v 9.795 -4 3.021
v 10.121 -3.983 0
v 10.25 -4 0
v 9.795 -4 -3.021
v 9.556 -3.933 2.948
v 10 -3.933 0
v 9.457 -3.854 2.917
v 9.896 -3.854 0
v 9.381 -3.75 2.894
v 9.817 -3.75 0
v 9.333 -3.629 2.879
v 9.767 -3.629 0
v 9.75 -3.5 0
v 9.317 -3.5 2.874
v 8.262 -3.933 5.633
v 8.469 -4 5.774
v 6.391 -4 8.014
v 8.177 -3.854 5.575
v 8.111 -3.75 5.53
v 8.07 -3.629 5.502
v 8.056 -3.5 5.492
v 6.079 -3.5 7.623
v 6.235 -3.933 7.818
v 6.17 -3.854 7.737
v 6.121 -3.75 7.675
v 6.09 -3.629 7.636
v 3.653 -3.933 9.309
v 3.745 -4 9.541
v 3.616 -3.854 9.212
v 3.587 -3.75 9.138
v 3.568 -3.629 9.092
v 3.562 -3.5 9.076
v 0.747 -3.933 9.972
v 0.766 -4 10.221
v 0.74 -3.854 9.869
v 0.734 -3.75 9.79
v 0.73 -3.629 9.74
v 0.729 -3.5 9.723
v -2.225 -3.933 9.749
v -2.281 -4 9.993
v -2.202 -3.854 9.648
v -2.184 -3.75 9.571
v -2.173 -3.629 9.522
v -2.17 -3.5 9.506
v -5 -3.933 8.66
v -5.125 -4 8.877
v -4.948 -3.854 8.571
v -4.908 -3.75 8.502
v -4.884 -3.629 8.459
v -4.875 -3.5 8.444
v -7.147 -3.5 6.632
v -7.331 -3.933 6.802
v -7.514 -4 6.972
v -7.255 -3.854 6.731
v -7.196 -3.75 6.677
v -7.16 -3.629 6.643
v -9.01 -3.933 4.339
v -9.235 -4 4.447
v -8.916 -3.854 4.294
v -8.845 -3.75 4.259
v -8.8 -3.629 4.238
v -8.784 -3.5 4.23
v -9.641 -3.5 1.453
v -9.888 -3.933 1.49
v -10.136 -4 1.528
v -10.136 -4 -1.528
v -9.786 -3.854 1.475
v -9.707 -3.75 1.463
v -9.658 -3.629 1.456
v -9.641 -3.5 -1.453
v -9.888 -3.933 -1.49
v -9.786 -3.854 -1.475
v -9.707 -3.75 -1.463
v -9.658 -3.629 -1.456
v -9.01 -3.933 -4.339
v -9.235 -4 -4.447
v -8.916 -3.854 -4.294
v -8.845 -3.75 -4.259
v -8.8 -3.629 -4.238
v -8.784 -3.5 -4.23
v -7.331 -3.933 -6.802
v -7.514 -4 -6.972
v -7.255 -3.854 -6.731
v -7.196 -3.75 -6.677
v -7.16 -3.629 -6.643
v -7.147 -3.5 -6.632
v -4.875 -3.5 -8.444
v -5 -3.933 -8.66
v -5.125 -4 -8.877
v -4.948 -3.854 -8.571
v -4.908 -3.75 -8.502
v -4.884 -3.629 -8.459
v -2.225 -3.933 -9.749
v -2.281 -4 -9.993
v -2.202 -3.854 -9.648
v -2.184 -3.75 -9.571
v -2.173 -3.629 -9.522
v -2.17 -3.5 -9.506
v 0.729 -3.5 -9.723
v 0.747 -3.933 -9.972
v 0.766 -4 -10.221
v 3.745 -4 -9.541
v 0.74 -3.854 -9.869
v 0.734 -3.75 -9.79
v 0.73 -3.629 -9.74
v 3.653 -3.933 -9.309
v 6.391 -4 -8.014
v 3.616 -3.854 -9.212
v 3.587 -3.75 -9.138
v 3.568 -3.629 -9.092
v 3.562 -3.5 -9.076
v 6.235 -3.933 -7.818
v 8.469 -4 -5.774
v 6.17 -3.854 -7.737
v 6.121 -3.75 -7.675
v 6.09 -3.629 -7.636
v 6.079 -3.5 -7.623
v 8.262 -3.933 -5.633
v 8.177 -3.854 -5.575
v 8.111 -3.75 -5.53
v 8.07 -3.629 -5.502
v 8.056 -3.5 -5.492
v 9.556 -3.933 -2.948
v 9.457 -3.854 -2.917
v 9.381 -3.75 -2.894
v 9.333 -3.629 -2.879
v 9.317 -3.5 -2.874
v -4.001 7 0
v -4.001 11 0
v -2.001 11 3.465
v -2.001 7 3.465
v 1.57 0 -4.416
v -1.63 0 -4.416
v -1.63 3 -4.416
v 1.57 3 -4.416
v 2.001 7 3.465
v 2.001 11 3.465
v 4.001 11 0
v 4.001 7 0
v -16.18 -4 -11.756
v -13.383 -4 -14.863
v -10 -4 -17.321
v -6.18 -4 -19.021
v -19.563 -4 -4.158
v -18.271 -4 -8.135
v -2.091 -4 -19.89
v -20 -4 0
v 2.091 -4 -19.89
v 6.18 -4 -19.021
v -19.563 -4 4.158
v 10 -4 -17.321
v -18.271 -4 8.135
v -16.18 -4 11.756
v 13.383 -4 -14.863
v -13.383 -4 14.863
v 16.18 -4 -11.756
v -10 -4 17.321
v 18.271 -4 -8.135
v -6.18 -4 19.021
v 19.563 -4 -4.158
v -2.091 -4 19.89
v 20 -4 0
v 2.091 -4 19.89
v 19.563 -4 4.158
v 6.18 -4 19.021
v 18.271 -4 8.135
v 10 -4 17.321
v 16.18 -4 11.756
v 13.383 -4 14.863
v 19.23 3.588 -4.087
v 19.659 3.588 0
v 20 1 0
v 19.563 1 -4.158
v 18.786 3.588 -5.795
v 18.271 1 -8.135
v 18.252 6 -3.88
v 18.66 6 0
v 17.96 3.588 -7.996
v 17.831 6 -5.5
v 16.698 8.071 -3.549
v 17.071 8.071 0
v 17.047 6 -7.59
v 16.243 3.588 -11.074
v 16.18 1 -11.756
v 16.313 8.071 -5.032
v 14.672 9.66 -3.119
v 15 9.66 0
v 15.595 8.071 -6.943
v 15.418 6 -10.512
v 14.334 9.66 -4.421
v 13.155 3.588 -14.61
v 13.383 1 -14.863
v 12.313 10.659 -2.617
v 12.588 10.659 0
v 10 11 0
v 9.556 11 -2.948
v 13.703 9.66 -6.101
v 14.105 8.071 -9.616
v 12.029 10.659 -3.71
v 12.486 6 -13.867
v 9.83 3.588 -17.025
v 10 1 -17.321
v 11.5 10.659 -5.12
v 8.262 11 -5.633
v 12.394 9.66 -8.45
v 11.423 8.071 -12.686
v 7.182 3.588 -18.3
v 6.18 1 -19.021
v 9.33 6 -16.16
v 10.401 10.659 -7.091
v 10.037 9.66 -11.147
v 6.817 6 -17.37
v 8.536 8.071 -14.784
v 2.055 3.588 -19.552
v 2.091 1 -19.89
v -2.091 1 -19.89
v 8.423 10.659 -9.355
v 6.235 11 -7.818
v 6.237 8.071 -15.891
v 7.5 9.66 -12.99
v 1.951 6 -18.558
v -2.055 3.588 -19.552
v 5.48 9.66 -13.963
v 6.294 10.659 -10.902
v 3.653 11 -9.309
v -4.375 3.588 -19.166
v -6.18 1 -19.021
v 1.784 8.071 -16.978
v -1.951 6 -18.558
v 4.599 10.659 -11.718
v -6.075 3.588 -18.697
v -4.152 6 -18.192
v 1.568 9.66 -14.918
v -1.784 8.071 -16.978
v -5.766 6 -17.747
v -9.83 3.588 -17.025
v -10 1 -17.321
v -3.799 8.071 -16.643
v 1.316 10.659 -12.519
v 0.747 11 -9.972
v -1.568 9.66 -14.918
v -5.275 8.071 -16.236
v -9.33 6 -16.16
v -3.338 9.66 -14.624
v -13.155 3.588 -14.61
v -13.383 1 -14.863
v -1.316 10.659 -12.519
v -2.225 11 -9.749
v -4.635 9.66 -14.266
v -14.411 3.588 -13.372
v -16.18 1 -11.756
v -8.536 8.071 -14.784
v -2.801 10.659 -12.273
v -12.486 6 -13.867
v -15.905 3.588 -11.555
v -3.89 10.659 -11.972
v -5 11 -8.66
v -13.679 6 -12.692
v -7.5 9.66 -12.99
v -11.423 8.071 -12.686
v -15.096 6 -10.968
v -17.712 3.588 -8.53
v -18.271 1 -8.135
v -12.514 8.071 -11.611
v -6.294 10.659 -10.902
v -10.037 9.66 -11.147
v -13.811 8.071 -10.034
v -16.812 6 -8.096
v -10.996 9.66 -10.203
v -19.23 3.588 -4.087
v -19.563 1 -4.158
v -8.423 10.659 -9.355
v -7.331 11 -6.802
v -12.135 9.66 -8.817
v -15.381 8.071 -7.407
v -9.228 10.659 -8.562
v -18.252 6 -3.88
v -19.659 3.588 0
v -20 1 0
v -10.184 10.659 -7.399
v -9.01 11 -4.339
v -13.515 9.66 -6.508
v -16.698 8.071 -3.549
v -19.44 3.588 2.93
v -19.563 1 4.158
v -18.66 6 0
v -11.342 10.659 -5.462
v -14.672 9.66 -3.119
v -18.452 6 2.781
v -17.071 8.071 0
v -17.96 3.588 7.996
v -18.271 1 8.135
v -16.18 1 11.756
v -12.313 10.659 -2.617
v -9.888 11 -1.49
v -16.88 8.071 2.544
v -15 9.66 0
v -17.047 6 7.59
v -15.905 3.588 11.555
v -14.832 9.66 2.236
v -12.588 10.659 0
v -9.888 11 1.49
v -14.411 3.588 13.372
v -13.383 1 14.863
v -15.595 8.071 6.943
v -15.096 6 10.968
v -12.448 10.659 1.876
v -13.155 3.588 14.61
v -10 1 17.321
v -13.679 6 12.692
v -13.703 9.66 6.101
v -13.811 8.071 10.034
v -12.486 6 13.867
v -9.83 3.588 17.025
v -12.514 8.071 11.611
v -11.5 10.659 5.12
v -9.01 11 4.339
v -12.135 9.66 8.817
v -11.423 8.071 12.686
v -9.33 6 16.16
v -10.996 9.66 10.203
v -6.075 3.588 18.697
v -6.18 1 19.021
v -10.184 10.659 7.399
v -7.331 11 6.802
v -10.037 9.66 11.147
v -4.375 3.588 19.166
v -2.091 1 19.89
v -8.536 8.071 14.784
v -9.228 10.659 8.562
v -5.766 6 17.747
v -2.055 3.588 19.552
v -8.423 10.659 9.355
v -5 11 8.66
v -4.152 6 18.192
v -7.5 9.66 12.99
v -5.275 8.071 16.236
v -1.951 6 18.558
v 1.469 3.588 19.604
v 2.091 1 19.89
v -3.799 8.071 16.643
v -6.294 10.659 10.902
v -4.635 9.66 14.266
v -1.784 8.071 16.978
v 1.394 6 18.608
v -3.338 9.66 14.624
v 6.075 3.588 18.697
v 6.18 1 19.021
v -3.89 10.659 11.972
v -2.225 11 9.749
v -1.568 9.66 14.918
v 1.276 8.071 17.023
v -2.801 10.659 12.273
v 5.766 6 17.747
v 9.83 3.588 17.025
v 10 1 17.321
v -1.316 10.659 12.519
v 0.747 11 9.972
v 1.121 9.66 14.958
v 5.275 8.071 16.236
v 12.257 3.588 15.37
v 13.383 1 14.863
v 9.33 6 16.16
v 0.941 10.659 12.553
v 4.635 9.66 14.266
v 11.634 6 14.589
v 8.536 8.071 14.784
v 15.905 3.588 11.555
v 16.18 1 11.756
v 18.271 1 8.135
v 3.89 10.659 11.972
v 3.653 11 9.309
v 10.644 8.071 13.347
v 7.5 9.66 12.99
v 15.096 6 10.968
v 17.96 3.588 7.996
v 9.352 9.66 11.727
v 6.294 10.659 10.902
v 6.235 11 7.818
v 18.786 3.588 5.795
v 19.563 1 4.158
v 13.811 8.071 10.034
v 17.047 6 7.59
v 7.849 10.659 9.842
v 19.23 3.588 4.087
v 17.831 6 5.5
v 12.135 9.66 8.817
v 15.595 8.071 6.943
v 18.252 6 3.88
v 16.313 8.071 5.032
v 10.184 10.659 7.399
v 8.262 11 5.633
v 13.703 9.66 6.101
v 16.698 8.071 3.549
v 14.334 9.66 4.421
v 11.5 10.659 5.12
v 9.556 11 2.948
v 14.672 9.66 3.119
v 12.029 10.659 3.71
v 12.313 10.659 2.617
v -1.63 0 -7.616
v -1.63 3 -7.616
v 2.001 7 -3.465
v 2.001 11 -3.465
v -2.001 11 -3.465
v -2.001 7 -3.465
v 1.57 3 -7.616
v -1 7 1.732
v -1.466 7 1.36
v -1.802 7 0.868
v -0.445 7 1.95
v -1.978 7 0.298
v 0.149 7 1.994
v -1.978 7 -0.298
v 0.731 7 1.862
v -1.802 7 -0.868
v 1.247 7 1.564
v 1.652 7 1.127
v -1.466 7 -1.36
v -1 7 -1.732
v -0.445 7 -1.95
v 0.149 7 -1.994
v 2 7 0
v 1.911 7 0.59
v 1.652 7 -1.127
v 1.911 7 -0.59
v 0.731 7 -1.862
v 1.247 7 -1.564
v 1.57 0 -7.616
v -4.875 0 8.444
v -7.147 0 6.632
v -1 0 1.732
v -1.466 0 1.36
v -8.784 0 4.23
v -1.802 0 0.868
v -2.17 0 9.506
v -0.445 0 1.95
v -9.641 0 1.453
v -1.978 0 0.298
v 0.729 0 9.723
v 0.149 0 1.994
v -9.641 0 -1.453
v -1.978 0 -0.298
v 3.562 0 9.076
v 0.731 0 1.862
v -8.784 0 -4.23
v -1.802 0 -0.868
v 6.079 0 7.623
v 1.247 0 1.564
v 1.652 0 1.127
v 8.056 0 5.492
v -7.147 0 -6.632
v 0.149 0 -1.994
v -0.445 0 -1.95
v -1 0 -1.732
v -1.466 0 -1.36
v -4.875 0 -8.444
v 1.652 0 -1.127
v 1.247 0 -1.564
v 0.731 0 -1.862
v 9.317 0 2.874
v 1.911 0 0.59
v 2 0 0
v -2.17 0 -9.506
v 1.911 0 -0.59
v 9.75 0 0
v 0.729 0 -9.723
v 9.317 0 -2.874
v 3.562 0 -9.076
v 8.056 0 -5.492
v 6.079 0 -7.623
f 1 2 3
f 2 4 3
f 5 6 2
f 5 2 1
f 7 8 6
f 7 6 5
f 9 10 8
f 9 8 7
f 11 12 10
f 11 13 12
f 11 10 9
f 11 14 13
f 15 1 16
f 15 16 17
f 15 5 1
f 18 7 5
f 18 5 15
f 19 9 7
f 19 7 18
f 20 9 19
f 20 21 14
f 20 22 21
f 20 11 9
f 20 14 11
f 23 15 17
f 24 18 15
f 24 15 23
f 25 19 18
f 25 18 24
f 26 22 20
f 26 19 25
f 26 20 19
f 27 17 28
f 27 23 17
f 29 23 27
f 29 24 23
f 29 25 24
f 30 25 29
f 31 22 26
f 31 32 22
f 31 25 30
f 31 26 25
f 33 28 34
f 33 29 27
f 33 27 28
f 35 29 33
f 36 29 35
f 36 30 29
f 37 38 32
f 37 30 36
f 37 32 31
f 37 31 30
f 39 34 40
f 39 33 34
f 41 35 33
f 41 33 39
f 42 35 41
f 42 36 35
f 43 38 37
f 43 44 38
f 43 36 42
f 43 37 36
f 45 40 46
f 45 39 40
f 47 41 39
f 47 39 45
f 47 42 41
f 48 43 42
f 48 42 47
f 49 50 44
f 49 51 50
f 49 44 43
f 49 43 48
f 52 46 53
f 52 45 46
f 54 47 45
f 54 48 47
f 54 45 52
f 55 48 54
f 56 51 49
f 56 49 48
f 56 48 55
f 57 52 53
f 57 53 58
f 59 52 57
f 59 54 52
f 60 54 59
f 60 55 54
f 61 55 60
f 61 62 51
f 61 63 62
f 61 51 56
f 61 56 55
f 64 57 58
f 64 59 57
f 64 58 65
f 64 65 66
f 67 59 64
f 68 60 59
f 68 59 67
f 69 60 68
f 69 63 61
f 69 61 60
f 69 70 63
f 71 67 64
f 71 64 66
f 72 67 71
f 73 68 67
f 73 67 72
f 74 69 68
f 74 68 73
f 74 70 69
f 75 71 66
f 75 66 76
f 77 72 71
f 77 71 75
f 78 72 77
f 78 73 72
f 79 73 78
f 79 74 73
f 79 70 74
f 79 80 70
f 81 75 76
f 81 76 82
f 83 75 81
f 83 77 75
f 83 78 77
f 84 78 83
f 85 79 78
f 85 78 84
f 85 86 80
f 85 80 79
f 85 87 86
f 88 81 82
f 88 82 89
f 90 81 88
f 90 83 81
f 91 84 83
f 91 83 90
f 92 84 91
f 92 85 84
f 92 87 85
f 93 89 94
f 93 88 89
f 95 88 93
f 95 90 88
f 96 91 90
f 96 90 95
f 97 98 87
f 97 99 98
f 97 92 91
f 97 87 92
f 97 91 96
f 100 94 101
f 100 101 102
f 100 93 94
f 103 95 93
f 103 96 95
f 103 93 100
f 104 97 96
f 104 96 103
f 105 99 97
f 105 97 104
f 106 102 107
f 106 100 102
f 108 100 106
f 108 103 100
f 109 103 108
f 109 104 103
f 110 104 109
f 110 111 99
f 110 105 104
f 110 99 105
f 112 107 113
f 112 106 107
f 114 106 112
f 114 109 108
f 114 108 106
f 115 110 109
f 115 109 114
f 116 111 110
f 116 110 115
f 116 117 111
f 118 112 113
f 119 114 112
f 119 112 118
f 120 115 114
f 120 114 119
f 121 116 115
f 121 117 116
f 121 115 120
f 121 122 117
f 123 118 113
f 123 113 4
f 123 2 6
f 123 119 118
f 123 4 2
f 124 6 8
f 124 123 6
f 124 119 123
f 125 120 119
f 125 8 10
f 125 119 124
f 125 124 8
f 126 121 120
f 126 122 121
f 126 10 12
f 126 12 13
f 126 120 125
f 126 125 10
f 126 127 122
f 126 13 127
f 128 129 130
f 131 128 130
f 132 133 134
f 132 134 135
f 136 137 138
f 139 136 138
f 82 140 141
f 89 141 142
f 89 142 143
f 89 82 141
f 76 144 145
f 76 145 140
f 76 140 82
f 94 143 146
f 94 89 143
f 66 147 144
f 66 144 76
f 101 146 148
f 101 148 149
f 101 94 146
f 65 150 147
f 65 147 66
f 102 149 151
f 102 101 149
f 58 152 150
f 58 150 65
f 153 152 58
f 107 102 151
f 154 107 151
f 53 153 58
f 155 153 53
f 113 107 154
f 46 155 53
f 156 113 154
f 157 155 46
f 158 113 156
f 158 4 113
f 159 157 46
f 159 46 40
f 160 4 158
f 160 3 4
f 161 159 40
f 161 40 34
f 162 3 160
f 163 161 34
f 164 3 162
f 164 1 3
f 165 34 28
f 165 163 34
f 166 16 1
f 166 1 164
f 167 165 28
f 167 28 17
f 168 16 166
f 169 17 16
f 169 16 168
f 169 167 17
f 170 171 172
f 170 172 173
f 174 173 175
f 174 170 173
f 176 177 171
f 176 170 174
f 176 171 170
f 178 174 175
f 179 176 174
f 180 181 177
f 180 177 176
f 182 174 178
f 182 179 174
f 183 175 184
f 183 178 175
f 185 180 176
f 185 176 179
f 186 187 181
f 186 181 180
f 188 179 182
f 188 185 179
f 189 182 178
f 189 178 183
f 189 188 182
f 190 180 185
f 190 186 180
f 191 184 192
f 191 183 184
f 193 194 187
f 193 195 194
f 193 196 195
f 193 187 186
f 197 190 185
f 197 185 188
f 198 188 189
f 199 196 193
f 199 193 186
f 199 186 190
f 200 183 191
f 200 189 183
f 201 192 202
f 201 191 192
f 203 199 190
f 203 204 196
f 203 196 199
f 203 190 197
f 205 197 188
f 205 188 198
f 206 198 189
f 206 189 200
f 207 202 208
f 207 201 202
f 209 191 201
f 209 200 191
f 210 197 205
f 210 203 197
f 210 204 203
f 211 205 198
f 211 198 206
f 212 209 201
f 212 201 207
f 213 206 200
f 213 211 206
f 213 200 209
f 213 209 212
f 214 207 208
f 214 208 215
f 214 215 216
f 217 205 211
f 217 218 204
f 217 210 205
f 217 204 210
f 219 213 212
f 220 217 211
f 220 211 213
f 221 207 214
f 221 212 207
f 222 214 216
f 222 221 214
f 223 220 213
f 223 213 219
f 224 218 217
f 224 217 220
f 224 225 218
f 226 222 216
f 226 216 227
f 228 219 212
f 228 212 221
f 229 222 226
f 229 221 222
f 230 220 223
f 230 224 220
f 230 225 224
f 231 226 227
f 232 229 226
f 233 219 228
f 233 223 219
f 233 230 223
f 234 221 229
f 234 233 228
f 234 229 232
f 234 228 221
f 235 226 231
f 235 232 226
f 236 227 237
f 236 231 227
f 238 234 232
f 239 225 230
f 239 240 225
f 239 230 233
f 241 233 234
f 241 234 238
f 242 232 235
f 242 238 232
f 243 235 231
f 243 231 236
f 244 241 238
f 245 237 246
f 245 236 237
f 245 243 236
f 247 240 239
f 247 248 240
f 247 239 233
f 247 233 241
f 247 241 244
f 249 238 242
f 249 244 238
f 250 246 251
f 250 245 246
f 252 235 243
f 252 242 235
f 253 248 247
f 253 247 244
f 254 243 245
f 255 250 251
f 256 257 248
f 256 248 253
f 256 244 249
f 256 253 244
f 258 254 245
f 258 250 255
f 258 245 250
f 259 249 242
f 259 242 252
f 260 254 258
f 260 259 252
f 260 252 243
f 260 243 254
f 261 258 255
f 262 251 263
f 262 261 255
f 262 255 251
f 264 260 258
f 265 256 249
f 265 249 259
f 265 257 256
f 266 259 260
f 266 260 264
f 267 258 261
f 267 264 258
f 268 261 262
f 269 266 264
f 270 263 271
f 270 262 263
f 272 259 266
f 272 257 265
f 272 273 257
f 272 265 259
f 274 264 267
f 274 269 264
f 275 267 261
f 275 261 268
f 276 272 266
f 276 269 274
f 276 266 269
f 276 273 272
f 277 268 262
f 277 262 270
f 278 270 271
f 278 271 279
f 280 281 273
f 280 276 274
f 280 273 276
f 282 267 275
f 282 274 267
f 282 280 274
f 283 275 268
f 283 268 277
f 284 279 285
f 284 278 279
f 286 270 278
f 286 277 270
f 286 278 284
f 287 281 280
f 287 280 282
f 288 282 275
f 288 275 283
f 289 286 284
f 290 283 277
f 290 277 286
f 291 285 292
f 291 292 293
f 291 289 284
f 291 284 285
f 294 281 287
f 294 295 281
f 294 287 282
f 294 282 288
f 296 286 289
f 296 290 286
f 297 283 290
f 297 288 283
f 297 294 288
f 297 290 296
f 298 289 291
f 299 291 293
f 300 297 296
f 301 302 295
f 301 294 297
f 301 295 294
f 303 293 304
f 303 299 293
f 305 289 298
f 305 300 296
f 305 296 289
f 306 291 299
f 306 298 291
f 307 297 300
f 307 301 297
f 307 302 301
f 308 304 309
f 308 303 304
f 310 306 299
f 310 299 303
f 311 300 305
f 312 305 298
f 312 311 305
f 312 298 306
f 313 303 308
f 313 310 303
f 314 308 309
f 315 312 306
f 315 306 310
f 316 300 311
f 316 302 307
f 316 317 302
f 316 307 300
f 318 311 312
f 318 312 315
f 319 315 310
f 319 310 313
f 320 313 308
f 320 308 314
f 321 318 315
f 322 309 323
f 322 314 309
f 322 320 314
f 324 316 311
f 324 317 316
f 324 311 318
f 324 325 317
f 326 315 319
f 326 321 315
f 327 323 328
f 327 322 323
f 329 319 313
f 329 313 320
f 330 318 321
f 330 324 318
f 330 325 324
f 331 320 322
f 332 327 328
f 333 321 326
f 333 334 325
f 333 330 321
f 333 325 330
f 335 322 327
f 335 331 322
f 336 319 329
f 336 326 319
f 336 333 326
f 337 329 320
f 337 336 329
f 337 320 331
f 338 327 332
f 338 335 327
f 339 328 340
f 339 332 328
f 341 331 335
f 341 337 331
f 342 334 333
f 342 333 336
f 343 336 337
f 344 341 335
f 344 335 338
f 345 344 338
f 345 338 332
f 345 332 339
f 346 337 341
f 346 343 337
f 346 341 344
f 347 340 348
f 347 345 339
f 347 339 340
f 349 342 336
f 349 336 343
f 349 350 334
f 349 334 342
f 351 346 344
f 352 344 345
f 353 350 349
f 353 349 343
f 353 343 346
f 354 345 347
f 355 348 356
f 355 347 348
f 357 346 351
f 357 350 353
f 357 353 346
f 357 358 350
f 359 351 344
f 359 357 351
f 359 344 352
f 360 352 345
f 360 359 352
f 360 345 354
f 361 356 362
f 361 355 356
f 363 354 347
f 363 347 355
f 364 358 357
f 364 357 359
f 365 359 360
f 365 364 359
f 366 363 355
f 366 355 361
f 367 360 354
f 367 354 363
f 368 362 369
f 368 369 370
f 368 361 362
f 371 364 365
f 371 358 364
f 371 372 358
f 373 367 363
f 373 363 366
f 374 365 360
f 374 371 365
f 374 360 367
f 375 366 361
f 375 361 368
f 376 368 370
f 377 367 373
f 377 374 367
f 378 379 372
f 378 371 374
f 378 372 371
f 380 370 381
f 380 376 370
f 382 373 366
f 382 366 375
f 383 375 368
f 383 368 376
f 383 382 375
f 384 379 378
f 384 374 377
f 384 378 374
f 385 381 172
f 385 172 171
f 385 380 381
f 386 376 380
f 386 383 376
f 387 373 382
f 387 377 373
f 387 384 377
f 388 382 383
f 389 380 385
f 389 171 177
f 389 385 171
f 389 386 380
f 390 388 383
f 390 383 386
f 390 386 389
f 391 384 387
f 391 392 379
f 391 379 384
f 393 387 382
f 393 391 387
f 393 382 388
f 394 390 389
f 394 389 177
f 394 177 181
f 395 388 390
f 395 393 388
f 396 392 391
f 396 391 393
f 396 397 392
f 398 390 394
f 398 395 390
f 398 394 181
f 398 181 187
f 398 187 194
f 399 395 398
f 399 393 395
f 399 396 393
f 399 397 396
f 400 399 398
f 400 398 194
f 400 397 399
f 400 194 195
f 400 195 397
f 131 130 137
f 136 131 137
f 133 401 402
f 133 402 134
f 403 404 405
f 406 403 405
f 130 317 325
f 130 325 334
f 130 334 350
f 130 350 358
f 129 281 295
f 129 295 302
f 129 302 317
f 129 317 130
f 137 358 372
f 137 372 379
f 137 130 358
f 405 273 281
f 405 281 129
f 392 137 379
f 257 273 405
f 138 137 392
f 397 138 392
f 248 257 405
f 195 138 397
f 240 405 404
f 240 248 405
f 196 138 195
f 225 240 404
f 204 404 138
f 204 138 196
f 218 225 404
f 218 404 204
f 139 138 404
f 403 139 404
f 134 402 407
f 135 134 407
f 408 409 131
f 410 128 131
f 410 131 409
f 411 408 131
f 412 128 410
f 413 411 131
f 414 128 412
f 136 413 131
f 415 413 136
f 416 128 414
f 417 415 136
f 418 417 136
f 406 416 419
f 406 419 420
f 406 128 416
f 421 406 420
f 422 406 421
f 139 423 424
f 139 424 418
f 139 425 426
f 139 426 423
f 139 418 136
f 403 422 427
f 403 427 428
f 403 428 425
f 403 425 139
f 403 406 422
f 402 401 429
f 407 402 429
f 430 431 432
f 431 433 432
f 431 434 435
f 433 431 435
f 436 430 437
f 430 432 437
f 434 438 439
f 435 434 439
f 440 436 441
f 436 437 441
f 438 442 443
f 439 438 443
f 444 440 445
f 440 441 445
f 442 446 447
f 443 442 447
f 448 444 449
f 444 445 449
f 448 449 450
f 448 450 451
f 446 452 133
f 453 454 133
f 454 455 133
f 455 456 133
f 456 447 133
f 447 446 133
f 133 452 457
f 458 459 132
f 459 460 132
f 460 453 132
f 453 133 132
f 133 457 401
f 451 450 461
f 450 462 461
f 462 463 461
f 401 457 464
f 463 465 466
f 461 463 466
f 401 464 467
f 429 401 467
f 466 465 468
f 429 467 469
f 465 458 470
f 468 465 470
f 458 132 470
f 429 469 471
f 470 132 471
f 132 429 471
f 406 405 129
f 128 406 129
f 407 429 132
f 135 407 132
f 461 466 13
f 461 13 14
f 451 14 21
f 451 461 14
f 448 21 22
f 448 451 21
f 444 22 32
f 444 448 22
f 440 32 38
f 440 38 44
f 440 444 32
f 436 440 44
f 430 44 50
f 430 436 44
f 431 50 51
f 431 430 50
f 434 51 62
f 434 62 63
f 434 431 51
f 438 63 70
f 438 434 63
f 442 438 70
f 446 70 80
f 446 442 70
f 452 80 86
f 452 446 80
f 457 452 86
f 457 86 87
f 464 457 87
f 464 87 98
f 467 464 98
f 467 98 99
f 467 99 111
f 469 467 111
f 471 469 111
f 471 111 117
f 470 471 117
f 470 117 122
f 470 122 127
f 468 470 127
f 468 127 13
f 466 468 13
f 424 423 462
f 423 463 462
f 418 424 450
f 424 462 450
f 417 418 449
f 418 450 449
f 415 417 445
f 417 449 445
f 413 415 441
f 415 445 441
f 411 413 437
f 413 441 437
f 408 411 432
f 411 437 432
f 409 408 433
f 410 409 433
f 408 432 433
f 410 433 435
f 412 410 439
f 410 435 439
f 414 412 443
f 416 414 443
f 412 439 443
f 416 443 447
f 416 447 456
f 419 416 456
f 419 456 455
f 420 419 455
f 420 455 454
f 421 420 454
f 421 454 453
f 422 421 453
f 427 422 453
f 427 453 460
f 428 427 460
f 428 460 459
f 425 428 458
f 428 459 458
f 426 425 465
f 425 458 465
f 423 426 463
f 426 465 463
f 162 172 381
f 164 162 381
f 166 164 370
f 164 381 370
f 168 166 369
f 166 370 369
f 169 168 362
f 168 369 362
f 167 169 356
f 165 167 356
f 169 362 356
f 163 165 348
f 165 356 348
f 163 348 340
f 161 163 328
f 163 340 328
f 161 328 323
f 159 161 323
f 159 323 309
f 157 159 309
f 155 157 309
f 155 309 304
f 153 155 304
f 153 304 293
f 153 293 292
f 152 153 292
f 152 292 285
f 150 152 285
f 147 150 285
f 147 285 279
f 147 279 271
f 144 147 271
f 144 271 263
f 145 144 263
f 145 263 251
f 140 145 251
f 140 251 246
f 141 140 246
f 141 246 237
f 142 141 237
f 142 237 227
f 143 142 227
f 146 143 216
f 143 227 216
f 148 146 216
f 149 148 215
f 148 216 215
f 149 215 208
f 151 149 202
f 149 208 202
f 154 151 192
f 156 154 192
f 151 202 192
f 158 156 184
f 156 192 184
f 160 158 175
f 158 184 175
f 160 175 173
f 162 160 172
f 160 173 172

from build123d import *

# Parameters (mm, degrees)
SKETCH1_R           = 9.75
SKETCH1_R_2         = 2
BOSS_EXTRUDE1_DEPTH = 3
SKETCH2_W           = 3.2
SKETCH2_H           = 3.2
CUT_EXTRUDE1_DEPTH  = 3
SKETCH3_R           = 20
BOSS_EXTRUDE2_DEPTH = 8
SKETCH4_R           = 20
SKETCH4_R_2         = 9.75
BOSS_EXTRUDE3_DEPTH = 7
FILLET2_R           = 10
SKETCH5_R           = 2
CUT_EXTRUDE2_DEPTH  = 9
CUT_EXTRUDE3_DEPTH  = 4
FILLET3_R           = 0.5


with BuildPart() as part:
    # Sketch1 → Boss-Extrude1 (new body)
    with BuildSketch(Plane(origin=(0, 0, 0), x_dir=(1, 0, 0), z_dir=(0, 1, 0))):
        Circle(SKETCH1_R)
        Circle(SKETCH1_R_2, mode=Mode.SUBTRACT)
    extrude(amount=BOSS_EXTRUDE1_DEPTH)

    # Sketch2 → Cut-Extrude1 (cut)
    with BuildSketch(Plane.XZ):
        with Locations((-0.030329448, -6.016441714)):
            Rectangle(SKETCH2_W, SKETCH2_H)
    extrude(amount=-CUT_EXTRUDE1_DEPTH, mode=Mode.SUBTRACT)

    # Sketch3 → Boss-Extrude2 (add)
    with BuildSketch(Plane(origin=(0, 3, 0), x_dir=(1, 0, 0), z_dir=(0, 1, 0))):
        Circle(SKETCH3_R)
    extrude(amount=BOSS_EXTRUDE2_DEPTH)

    # Sketch4 → Boss-Extrude3 (add)
    with BuildSketch(Plane.XZ.offset(-3)):
        Circle(SKETCH4_R)
        Circle(SKETCH4_R_2, mode=Mode.SUBTRACT)
    extrude(amount=BOSS_EXTRUDE3_DEPTH)

    # Fillet2
    fillet2_edges = [part.edges().sort_by_distance(p)[0] for p in [
        (-20, 11, 0),
    ]]
    fillet(fillet2_edges, radius=FILLET2_R)

    # Sketch5 → Cut-Extrude2 (cut, through all)
    with BuildSketch(Plane.XZ.offset(-3)):
        Circle(SKETCH5_R)
    extrude(amount=-CUT_EXTRUDE2_DEPTH, mode=Mode.SUBTRACT)

    # Sketch6 → Cut-Extrude3 (cut)
    with BuildSketch(Plane(origin=(0, 11, 0), x_dir=(1, 0, 0), z_dir=(0, 1, 0))):
        Polygon((4.001037365, 0), (2.000518683, 3.465), (-2.000518683, 3.465), (-4.001037365, 0), (-2.000518683, -3.465), (2.000518683, -3.465), align=None)
    extrude(amount=-CUT_EXTRUDE3_DEPTH, mode=Mode.SUBTRACT)

    # Fillet3
    fillet3_edges = [part.edges().sort_by_distance(p)[0] for p in [
        (-9.75, -4, 0),
    ]]
    fillet(fillet3_edges, radius=FILLET3_R)


solid = part.part
